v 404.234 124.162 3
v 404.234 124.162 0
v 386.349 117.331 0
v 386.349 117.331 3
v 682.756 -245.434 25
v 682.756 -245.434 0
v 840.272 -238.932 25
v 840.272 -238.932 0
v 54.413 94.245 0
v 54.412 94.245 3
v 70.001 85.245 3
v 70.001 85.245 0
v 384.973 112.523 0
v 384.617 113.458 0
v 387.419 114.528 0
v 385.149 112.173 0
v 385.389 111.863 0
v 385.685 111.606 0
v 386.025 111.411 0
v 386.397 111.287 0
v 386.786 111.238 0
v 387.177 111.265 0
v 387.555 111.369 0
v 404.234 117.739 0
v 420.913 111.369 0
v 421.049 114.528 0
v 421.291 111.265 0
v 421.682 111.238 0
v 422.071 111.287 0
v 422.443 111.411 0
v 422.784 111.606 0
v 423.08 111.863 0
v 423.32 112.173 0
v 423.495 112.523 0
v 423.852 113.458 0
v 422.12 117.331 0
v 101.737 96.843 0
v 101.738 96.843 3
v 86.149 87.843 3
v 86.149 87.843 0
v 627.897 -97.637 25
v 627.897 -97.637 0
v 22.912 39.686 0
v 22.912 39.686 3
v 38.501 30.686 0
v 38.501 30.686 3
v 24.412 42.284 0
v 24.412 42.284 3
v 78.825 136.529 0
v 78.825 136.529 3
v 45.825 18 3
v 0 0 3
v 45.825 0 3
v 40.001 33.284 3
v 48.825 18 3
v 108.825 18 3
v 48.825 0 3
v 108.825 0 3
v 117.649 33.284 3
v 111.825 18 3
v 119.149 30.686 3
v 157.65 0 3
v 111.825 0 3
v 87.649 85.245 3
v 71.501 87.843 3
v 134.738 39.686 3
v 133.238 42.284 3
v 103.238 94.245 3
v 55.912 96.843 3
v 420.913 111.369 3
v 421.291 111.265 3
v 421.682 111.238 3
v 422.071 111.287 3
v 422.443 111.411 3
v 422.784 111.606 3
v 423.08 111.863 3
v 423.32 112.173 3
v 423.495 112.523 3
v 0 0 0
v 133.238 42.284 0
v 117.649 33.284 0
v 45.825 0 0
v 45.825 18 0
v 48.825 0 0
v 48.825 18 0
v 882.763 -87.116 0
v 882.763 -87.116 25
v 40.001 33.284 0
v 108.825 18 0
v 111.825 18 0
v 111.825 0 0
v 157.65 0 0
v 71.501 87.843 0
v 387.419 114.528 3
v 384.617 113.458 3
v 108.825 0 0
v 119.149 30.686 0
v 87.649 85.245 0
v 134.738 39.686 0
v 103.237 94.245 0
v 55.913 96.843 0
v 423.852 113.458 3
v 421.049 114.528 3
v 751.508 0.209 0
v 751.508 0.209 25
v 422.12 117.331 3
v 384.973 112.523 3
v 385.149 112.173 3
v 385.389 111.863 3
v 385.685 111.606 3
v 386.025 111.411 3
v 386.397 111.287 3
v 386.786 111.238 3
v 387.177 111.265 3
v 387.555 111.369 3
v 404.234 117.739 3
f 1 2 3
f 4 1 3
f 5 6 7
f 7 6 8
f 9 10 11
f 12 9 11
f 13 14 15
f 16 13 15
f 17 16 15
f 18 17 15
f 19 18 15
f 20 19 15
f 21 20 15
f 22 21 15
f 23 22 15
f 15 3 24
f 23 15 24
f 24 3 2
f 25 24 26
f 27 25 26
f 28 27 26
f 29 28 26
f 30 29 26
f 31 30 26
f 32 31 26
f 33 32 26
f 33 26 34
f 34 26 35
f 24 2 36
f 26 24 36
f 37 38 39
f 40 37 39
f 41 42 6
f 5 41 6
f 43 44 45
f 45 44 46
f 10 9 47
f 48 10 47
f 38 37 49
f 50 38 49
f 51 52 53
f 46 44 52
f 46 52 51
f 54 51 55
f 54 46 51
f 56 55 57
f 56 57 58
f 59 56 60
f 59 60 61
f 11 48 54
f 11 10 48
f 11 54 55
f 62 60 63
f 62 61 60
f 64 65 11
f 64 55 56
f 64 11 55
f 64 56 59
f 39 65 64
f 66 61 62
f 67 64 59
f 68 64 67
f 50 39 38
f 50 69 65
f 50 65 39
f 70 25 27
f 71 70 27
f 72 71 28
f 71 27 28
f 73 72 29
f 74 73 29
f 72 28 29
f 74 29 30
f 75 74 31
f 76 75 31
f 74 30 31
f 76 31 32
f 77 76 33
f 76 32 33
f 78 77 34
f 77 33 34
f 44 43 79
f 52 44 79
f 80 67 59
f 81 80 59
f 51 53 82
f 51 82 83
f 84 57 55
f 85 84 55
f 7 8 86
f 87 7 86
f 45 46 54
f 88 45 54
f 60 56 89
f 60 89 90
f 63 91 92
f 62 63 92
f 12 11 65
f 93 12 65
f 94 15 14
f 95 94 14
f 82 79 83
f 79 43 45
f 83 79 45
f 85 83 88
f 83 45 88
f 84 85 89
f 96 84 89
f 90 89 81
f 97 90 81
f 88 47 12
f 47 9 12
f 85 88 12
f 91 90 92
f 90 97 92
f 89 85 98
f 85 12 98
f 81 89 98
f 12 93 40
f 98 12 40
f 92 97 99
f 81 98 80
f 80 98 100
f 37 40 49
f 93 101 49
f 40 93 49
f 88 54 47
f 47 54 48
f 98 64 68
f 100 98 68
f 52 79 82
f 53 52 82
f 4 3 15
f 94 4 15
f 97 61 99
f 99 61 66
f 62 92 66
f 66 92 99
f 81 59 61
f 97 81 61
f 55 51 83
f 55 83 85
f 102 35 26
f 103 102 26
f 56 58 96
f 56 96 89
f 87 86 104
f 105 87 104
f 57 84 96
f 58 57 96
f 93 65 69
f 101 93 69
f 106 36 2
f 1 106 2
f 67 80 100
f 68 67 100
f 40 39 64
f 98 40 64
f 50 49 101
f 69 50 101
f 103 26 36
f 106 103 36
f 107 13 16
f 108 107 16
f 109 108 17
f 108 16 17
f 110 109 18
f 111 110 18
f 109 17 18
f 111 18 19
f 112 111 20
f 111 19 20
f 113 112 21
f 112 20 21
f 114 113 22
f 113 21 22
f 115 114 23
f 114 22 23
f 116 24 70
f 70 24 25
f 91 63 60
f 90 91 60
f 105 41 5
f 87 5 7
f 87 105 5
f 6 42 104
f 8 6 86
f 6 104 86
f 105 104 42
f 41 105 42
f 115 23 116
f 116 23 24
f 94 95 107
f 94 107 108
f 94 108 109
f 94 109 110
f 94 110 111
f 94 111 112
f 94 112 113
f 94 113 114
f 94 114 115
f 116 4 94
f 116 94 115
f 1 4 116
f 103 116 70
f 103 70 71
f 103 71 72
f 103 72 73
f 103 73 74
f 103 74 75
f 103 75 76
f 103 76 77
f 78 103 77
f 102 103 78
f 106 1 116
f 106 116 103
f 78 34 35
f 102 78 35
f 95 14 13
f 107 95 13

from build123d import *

# Parameters (mm, degrees)
F2_DEPTH = 3
F4_DEPTH = 25
F5_W     = 3
F5_H     = 18
F6_DEPTH = 25
F8_DEPTH = 3


with BuildPart() as f2:
    # F0 (on Top) → F2 (new body)
    with BuildSketch(Plane.XY):
        Polygon((78.825, 136.528905), (0, 0), (157.65, 0), align=None)
    extrude(amount=F2_DEPTH)

    # F5 (on face) → F6 (cut)
    with BuildSketch(Plane.XY.offset(3)):
        with Locations((47.325, 9)):
            Rectangle(F5_W, F5_H)
        with Locations((110.325, 9)):
            Rectangle(F5_W, F5_H)
        Polygon((38.500957, 30.685614), (40.000957, 33.28369), (24.4125, 42.28369), (22.9125, 39.685614), align=None)
        Polygon((70.000957, 85.245215), (71.500957, 87.843291), (55.9125, 96.843291), (54.4125, 94.245215), align=None)
        Polygon((103.2375, 94.245215), (101.7375, 96.843291), (86.149043, 87.843291), (87.649043, 85.245215), align=None)
        Polygon((134.7375, 39.685614), (133.2375, 42.28369), (117.649043, 33.28369), (119.149043, 30.685614), align=None)
    extrude(amount=-F6_DEPTH, mode=Mode.SUBTRACT)


with BuildPart() as f4:
    # F3 (on Top) → F4 (new body)
    with BuildSketch(Plane.XY):
        Polygon((840.272062, -238.931533), (882.762891, -87.115684), (751.507827, 0.209173), (627.896907, -97.636945), (682.756221, -245.43403), align=None)
    extrude(amount=F4_DEPTH)


with BuildPart() as f8:
    # F7 (on Top) → F8 (new body)
    with BuildSketch(Plane.XY):
        with BuildLine():
            Line((422.119806, 117.33051), (404.234227, 124.162137))
            Line((404.234227, 124.162137), (386.348648, 117.33051))
            Line((386.348648, 117.33051), (387.419107, 114.52799))
            Line((387.419107, 114.52799), (384.616587, 113.457531))
            Line((384.616587, 113.457531), (384.973406, 112.523358))
            ThreePointArc((384.973406, 112.523358), (386.025251, 111.411257), (387.555392, 111.36865))
            Line((387.555392, 111.36865), (404.234227, 117.739346))
            Line((404.234227, 117.739346), (420.913062, 111.36865))
            ThreePointArc((420.913062, 111.36865), (422.443202, 111.411257), (423.495047, 112.523358))
            Line((423.495047, 112.523358), (423.851867, 113.457531))
            Line((423.851867, 113.457531), (421.049347, 114.52799))
            Line((421.049347, 114.52799), (422.119806, 117.33051))
        make_face()
    extrude(amount=F8_DEPTH)


solid = Compound([f2.part, f4.part, f8.part])
